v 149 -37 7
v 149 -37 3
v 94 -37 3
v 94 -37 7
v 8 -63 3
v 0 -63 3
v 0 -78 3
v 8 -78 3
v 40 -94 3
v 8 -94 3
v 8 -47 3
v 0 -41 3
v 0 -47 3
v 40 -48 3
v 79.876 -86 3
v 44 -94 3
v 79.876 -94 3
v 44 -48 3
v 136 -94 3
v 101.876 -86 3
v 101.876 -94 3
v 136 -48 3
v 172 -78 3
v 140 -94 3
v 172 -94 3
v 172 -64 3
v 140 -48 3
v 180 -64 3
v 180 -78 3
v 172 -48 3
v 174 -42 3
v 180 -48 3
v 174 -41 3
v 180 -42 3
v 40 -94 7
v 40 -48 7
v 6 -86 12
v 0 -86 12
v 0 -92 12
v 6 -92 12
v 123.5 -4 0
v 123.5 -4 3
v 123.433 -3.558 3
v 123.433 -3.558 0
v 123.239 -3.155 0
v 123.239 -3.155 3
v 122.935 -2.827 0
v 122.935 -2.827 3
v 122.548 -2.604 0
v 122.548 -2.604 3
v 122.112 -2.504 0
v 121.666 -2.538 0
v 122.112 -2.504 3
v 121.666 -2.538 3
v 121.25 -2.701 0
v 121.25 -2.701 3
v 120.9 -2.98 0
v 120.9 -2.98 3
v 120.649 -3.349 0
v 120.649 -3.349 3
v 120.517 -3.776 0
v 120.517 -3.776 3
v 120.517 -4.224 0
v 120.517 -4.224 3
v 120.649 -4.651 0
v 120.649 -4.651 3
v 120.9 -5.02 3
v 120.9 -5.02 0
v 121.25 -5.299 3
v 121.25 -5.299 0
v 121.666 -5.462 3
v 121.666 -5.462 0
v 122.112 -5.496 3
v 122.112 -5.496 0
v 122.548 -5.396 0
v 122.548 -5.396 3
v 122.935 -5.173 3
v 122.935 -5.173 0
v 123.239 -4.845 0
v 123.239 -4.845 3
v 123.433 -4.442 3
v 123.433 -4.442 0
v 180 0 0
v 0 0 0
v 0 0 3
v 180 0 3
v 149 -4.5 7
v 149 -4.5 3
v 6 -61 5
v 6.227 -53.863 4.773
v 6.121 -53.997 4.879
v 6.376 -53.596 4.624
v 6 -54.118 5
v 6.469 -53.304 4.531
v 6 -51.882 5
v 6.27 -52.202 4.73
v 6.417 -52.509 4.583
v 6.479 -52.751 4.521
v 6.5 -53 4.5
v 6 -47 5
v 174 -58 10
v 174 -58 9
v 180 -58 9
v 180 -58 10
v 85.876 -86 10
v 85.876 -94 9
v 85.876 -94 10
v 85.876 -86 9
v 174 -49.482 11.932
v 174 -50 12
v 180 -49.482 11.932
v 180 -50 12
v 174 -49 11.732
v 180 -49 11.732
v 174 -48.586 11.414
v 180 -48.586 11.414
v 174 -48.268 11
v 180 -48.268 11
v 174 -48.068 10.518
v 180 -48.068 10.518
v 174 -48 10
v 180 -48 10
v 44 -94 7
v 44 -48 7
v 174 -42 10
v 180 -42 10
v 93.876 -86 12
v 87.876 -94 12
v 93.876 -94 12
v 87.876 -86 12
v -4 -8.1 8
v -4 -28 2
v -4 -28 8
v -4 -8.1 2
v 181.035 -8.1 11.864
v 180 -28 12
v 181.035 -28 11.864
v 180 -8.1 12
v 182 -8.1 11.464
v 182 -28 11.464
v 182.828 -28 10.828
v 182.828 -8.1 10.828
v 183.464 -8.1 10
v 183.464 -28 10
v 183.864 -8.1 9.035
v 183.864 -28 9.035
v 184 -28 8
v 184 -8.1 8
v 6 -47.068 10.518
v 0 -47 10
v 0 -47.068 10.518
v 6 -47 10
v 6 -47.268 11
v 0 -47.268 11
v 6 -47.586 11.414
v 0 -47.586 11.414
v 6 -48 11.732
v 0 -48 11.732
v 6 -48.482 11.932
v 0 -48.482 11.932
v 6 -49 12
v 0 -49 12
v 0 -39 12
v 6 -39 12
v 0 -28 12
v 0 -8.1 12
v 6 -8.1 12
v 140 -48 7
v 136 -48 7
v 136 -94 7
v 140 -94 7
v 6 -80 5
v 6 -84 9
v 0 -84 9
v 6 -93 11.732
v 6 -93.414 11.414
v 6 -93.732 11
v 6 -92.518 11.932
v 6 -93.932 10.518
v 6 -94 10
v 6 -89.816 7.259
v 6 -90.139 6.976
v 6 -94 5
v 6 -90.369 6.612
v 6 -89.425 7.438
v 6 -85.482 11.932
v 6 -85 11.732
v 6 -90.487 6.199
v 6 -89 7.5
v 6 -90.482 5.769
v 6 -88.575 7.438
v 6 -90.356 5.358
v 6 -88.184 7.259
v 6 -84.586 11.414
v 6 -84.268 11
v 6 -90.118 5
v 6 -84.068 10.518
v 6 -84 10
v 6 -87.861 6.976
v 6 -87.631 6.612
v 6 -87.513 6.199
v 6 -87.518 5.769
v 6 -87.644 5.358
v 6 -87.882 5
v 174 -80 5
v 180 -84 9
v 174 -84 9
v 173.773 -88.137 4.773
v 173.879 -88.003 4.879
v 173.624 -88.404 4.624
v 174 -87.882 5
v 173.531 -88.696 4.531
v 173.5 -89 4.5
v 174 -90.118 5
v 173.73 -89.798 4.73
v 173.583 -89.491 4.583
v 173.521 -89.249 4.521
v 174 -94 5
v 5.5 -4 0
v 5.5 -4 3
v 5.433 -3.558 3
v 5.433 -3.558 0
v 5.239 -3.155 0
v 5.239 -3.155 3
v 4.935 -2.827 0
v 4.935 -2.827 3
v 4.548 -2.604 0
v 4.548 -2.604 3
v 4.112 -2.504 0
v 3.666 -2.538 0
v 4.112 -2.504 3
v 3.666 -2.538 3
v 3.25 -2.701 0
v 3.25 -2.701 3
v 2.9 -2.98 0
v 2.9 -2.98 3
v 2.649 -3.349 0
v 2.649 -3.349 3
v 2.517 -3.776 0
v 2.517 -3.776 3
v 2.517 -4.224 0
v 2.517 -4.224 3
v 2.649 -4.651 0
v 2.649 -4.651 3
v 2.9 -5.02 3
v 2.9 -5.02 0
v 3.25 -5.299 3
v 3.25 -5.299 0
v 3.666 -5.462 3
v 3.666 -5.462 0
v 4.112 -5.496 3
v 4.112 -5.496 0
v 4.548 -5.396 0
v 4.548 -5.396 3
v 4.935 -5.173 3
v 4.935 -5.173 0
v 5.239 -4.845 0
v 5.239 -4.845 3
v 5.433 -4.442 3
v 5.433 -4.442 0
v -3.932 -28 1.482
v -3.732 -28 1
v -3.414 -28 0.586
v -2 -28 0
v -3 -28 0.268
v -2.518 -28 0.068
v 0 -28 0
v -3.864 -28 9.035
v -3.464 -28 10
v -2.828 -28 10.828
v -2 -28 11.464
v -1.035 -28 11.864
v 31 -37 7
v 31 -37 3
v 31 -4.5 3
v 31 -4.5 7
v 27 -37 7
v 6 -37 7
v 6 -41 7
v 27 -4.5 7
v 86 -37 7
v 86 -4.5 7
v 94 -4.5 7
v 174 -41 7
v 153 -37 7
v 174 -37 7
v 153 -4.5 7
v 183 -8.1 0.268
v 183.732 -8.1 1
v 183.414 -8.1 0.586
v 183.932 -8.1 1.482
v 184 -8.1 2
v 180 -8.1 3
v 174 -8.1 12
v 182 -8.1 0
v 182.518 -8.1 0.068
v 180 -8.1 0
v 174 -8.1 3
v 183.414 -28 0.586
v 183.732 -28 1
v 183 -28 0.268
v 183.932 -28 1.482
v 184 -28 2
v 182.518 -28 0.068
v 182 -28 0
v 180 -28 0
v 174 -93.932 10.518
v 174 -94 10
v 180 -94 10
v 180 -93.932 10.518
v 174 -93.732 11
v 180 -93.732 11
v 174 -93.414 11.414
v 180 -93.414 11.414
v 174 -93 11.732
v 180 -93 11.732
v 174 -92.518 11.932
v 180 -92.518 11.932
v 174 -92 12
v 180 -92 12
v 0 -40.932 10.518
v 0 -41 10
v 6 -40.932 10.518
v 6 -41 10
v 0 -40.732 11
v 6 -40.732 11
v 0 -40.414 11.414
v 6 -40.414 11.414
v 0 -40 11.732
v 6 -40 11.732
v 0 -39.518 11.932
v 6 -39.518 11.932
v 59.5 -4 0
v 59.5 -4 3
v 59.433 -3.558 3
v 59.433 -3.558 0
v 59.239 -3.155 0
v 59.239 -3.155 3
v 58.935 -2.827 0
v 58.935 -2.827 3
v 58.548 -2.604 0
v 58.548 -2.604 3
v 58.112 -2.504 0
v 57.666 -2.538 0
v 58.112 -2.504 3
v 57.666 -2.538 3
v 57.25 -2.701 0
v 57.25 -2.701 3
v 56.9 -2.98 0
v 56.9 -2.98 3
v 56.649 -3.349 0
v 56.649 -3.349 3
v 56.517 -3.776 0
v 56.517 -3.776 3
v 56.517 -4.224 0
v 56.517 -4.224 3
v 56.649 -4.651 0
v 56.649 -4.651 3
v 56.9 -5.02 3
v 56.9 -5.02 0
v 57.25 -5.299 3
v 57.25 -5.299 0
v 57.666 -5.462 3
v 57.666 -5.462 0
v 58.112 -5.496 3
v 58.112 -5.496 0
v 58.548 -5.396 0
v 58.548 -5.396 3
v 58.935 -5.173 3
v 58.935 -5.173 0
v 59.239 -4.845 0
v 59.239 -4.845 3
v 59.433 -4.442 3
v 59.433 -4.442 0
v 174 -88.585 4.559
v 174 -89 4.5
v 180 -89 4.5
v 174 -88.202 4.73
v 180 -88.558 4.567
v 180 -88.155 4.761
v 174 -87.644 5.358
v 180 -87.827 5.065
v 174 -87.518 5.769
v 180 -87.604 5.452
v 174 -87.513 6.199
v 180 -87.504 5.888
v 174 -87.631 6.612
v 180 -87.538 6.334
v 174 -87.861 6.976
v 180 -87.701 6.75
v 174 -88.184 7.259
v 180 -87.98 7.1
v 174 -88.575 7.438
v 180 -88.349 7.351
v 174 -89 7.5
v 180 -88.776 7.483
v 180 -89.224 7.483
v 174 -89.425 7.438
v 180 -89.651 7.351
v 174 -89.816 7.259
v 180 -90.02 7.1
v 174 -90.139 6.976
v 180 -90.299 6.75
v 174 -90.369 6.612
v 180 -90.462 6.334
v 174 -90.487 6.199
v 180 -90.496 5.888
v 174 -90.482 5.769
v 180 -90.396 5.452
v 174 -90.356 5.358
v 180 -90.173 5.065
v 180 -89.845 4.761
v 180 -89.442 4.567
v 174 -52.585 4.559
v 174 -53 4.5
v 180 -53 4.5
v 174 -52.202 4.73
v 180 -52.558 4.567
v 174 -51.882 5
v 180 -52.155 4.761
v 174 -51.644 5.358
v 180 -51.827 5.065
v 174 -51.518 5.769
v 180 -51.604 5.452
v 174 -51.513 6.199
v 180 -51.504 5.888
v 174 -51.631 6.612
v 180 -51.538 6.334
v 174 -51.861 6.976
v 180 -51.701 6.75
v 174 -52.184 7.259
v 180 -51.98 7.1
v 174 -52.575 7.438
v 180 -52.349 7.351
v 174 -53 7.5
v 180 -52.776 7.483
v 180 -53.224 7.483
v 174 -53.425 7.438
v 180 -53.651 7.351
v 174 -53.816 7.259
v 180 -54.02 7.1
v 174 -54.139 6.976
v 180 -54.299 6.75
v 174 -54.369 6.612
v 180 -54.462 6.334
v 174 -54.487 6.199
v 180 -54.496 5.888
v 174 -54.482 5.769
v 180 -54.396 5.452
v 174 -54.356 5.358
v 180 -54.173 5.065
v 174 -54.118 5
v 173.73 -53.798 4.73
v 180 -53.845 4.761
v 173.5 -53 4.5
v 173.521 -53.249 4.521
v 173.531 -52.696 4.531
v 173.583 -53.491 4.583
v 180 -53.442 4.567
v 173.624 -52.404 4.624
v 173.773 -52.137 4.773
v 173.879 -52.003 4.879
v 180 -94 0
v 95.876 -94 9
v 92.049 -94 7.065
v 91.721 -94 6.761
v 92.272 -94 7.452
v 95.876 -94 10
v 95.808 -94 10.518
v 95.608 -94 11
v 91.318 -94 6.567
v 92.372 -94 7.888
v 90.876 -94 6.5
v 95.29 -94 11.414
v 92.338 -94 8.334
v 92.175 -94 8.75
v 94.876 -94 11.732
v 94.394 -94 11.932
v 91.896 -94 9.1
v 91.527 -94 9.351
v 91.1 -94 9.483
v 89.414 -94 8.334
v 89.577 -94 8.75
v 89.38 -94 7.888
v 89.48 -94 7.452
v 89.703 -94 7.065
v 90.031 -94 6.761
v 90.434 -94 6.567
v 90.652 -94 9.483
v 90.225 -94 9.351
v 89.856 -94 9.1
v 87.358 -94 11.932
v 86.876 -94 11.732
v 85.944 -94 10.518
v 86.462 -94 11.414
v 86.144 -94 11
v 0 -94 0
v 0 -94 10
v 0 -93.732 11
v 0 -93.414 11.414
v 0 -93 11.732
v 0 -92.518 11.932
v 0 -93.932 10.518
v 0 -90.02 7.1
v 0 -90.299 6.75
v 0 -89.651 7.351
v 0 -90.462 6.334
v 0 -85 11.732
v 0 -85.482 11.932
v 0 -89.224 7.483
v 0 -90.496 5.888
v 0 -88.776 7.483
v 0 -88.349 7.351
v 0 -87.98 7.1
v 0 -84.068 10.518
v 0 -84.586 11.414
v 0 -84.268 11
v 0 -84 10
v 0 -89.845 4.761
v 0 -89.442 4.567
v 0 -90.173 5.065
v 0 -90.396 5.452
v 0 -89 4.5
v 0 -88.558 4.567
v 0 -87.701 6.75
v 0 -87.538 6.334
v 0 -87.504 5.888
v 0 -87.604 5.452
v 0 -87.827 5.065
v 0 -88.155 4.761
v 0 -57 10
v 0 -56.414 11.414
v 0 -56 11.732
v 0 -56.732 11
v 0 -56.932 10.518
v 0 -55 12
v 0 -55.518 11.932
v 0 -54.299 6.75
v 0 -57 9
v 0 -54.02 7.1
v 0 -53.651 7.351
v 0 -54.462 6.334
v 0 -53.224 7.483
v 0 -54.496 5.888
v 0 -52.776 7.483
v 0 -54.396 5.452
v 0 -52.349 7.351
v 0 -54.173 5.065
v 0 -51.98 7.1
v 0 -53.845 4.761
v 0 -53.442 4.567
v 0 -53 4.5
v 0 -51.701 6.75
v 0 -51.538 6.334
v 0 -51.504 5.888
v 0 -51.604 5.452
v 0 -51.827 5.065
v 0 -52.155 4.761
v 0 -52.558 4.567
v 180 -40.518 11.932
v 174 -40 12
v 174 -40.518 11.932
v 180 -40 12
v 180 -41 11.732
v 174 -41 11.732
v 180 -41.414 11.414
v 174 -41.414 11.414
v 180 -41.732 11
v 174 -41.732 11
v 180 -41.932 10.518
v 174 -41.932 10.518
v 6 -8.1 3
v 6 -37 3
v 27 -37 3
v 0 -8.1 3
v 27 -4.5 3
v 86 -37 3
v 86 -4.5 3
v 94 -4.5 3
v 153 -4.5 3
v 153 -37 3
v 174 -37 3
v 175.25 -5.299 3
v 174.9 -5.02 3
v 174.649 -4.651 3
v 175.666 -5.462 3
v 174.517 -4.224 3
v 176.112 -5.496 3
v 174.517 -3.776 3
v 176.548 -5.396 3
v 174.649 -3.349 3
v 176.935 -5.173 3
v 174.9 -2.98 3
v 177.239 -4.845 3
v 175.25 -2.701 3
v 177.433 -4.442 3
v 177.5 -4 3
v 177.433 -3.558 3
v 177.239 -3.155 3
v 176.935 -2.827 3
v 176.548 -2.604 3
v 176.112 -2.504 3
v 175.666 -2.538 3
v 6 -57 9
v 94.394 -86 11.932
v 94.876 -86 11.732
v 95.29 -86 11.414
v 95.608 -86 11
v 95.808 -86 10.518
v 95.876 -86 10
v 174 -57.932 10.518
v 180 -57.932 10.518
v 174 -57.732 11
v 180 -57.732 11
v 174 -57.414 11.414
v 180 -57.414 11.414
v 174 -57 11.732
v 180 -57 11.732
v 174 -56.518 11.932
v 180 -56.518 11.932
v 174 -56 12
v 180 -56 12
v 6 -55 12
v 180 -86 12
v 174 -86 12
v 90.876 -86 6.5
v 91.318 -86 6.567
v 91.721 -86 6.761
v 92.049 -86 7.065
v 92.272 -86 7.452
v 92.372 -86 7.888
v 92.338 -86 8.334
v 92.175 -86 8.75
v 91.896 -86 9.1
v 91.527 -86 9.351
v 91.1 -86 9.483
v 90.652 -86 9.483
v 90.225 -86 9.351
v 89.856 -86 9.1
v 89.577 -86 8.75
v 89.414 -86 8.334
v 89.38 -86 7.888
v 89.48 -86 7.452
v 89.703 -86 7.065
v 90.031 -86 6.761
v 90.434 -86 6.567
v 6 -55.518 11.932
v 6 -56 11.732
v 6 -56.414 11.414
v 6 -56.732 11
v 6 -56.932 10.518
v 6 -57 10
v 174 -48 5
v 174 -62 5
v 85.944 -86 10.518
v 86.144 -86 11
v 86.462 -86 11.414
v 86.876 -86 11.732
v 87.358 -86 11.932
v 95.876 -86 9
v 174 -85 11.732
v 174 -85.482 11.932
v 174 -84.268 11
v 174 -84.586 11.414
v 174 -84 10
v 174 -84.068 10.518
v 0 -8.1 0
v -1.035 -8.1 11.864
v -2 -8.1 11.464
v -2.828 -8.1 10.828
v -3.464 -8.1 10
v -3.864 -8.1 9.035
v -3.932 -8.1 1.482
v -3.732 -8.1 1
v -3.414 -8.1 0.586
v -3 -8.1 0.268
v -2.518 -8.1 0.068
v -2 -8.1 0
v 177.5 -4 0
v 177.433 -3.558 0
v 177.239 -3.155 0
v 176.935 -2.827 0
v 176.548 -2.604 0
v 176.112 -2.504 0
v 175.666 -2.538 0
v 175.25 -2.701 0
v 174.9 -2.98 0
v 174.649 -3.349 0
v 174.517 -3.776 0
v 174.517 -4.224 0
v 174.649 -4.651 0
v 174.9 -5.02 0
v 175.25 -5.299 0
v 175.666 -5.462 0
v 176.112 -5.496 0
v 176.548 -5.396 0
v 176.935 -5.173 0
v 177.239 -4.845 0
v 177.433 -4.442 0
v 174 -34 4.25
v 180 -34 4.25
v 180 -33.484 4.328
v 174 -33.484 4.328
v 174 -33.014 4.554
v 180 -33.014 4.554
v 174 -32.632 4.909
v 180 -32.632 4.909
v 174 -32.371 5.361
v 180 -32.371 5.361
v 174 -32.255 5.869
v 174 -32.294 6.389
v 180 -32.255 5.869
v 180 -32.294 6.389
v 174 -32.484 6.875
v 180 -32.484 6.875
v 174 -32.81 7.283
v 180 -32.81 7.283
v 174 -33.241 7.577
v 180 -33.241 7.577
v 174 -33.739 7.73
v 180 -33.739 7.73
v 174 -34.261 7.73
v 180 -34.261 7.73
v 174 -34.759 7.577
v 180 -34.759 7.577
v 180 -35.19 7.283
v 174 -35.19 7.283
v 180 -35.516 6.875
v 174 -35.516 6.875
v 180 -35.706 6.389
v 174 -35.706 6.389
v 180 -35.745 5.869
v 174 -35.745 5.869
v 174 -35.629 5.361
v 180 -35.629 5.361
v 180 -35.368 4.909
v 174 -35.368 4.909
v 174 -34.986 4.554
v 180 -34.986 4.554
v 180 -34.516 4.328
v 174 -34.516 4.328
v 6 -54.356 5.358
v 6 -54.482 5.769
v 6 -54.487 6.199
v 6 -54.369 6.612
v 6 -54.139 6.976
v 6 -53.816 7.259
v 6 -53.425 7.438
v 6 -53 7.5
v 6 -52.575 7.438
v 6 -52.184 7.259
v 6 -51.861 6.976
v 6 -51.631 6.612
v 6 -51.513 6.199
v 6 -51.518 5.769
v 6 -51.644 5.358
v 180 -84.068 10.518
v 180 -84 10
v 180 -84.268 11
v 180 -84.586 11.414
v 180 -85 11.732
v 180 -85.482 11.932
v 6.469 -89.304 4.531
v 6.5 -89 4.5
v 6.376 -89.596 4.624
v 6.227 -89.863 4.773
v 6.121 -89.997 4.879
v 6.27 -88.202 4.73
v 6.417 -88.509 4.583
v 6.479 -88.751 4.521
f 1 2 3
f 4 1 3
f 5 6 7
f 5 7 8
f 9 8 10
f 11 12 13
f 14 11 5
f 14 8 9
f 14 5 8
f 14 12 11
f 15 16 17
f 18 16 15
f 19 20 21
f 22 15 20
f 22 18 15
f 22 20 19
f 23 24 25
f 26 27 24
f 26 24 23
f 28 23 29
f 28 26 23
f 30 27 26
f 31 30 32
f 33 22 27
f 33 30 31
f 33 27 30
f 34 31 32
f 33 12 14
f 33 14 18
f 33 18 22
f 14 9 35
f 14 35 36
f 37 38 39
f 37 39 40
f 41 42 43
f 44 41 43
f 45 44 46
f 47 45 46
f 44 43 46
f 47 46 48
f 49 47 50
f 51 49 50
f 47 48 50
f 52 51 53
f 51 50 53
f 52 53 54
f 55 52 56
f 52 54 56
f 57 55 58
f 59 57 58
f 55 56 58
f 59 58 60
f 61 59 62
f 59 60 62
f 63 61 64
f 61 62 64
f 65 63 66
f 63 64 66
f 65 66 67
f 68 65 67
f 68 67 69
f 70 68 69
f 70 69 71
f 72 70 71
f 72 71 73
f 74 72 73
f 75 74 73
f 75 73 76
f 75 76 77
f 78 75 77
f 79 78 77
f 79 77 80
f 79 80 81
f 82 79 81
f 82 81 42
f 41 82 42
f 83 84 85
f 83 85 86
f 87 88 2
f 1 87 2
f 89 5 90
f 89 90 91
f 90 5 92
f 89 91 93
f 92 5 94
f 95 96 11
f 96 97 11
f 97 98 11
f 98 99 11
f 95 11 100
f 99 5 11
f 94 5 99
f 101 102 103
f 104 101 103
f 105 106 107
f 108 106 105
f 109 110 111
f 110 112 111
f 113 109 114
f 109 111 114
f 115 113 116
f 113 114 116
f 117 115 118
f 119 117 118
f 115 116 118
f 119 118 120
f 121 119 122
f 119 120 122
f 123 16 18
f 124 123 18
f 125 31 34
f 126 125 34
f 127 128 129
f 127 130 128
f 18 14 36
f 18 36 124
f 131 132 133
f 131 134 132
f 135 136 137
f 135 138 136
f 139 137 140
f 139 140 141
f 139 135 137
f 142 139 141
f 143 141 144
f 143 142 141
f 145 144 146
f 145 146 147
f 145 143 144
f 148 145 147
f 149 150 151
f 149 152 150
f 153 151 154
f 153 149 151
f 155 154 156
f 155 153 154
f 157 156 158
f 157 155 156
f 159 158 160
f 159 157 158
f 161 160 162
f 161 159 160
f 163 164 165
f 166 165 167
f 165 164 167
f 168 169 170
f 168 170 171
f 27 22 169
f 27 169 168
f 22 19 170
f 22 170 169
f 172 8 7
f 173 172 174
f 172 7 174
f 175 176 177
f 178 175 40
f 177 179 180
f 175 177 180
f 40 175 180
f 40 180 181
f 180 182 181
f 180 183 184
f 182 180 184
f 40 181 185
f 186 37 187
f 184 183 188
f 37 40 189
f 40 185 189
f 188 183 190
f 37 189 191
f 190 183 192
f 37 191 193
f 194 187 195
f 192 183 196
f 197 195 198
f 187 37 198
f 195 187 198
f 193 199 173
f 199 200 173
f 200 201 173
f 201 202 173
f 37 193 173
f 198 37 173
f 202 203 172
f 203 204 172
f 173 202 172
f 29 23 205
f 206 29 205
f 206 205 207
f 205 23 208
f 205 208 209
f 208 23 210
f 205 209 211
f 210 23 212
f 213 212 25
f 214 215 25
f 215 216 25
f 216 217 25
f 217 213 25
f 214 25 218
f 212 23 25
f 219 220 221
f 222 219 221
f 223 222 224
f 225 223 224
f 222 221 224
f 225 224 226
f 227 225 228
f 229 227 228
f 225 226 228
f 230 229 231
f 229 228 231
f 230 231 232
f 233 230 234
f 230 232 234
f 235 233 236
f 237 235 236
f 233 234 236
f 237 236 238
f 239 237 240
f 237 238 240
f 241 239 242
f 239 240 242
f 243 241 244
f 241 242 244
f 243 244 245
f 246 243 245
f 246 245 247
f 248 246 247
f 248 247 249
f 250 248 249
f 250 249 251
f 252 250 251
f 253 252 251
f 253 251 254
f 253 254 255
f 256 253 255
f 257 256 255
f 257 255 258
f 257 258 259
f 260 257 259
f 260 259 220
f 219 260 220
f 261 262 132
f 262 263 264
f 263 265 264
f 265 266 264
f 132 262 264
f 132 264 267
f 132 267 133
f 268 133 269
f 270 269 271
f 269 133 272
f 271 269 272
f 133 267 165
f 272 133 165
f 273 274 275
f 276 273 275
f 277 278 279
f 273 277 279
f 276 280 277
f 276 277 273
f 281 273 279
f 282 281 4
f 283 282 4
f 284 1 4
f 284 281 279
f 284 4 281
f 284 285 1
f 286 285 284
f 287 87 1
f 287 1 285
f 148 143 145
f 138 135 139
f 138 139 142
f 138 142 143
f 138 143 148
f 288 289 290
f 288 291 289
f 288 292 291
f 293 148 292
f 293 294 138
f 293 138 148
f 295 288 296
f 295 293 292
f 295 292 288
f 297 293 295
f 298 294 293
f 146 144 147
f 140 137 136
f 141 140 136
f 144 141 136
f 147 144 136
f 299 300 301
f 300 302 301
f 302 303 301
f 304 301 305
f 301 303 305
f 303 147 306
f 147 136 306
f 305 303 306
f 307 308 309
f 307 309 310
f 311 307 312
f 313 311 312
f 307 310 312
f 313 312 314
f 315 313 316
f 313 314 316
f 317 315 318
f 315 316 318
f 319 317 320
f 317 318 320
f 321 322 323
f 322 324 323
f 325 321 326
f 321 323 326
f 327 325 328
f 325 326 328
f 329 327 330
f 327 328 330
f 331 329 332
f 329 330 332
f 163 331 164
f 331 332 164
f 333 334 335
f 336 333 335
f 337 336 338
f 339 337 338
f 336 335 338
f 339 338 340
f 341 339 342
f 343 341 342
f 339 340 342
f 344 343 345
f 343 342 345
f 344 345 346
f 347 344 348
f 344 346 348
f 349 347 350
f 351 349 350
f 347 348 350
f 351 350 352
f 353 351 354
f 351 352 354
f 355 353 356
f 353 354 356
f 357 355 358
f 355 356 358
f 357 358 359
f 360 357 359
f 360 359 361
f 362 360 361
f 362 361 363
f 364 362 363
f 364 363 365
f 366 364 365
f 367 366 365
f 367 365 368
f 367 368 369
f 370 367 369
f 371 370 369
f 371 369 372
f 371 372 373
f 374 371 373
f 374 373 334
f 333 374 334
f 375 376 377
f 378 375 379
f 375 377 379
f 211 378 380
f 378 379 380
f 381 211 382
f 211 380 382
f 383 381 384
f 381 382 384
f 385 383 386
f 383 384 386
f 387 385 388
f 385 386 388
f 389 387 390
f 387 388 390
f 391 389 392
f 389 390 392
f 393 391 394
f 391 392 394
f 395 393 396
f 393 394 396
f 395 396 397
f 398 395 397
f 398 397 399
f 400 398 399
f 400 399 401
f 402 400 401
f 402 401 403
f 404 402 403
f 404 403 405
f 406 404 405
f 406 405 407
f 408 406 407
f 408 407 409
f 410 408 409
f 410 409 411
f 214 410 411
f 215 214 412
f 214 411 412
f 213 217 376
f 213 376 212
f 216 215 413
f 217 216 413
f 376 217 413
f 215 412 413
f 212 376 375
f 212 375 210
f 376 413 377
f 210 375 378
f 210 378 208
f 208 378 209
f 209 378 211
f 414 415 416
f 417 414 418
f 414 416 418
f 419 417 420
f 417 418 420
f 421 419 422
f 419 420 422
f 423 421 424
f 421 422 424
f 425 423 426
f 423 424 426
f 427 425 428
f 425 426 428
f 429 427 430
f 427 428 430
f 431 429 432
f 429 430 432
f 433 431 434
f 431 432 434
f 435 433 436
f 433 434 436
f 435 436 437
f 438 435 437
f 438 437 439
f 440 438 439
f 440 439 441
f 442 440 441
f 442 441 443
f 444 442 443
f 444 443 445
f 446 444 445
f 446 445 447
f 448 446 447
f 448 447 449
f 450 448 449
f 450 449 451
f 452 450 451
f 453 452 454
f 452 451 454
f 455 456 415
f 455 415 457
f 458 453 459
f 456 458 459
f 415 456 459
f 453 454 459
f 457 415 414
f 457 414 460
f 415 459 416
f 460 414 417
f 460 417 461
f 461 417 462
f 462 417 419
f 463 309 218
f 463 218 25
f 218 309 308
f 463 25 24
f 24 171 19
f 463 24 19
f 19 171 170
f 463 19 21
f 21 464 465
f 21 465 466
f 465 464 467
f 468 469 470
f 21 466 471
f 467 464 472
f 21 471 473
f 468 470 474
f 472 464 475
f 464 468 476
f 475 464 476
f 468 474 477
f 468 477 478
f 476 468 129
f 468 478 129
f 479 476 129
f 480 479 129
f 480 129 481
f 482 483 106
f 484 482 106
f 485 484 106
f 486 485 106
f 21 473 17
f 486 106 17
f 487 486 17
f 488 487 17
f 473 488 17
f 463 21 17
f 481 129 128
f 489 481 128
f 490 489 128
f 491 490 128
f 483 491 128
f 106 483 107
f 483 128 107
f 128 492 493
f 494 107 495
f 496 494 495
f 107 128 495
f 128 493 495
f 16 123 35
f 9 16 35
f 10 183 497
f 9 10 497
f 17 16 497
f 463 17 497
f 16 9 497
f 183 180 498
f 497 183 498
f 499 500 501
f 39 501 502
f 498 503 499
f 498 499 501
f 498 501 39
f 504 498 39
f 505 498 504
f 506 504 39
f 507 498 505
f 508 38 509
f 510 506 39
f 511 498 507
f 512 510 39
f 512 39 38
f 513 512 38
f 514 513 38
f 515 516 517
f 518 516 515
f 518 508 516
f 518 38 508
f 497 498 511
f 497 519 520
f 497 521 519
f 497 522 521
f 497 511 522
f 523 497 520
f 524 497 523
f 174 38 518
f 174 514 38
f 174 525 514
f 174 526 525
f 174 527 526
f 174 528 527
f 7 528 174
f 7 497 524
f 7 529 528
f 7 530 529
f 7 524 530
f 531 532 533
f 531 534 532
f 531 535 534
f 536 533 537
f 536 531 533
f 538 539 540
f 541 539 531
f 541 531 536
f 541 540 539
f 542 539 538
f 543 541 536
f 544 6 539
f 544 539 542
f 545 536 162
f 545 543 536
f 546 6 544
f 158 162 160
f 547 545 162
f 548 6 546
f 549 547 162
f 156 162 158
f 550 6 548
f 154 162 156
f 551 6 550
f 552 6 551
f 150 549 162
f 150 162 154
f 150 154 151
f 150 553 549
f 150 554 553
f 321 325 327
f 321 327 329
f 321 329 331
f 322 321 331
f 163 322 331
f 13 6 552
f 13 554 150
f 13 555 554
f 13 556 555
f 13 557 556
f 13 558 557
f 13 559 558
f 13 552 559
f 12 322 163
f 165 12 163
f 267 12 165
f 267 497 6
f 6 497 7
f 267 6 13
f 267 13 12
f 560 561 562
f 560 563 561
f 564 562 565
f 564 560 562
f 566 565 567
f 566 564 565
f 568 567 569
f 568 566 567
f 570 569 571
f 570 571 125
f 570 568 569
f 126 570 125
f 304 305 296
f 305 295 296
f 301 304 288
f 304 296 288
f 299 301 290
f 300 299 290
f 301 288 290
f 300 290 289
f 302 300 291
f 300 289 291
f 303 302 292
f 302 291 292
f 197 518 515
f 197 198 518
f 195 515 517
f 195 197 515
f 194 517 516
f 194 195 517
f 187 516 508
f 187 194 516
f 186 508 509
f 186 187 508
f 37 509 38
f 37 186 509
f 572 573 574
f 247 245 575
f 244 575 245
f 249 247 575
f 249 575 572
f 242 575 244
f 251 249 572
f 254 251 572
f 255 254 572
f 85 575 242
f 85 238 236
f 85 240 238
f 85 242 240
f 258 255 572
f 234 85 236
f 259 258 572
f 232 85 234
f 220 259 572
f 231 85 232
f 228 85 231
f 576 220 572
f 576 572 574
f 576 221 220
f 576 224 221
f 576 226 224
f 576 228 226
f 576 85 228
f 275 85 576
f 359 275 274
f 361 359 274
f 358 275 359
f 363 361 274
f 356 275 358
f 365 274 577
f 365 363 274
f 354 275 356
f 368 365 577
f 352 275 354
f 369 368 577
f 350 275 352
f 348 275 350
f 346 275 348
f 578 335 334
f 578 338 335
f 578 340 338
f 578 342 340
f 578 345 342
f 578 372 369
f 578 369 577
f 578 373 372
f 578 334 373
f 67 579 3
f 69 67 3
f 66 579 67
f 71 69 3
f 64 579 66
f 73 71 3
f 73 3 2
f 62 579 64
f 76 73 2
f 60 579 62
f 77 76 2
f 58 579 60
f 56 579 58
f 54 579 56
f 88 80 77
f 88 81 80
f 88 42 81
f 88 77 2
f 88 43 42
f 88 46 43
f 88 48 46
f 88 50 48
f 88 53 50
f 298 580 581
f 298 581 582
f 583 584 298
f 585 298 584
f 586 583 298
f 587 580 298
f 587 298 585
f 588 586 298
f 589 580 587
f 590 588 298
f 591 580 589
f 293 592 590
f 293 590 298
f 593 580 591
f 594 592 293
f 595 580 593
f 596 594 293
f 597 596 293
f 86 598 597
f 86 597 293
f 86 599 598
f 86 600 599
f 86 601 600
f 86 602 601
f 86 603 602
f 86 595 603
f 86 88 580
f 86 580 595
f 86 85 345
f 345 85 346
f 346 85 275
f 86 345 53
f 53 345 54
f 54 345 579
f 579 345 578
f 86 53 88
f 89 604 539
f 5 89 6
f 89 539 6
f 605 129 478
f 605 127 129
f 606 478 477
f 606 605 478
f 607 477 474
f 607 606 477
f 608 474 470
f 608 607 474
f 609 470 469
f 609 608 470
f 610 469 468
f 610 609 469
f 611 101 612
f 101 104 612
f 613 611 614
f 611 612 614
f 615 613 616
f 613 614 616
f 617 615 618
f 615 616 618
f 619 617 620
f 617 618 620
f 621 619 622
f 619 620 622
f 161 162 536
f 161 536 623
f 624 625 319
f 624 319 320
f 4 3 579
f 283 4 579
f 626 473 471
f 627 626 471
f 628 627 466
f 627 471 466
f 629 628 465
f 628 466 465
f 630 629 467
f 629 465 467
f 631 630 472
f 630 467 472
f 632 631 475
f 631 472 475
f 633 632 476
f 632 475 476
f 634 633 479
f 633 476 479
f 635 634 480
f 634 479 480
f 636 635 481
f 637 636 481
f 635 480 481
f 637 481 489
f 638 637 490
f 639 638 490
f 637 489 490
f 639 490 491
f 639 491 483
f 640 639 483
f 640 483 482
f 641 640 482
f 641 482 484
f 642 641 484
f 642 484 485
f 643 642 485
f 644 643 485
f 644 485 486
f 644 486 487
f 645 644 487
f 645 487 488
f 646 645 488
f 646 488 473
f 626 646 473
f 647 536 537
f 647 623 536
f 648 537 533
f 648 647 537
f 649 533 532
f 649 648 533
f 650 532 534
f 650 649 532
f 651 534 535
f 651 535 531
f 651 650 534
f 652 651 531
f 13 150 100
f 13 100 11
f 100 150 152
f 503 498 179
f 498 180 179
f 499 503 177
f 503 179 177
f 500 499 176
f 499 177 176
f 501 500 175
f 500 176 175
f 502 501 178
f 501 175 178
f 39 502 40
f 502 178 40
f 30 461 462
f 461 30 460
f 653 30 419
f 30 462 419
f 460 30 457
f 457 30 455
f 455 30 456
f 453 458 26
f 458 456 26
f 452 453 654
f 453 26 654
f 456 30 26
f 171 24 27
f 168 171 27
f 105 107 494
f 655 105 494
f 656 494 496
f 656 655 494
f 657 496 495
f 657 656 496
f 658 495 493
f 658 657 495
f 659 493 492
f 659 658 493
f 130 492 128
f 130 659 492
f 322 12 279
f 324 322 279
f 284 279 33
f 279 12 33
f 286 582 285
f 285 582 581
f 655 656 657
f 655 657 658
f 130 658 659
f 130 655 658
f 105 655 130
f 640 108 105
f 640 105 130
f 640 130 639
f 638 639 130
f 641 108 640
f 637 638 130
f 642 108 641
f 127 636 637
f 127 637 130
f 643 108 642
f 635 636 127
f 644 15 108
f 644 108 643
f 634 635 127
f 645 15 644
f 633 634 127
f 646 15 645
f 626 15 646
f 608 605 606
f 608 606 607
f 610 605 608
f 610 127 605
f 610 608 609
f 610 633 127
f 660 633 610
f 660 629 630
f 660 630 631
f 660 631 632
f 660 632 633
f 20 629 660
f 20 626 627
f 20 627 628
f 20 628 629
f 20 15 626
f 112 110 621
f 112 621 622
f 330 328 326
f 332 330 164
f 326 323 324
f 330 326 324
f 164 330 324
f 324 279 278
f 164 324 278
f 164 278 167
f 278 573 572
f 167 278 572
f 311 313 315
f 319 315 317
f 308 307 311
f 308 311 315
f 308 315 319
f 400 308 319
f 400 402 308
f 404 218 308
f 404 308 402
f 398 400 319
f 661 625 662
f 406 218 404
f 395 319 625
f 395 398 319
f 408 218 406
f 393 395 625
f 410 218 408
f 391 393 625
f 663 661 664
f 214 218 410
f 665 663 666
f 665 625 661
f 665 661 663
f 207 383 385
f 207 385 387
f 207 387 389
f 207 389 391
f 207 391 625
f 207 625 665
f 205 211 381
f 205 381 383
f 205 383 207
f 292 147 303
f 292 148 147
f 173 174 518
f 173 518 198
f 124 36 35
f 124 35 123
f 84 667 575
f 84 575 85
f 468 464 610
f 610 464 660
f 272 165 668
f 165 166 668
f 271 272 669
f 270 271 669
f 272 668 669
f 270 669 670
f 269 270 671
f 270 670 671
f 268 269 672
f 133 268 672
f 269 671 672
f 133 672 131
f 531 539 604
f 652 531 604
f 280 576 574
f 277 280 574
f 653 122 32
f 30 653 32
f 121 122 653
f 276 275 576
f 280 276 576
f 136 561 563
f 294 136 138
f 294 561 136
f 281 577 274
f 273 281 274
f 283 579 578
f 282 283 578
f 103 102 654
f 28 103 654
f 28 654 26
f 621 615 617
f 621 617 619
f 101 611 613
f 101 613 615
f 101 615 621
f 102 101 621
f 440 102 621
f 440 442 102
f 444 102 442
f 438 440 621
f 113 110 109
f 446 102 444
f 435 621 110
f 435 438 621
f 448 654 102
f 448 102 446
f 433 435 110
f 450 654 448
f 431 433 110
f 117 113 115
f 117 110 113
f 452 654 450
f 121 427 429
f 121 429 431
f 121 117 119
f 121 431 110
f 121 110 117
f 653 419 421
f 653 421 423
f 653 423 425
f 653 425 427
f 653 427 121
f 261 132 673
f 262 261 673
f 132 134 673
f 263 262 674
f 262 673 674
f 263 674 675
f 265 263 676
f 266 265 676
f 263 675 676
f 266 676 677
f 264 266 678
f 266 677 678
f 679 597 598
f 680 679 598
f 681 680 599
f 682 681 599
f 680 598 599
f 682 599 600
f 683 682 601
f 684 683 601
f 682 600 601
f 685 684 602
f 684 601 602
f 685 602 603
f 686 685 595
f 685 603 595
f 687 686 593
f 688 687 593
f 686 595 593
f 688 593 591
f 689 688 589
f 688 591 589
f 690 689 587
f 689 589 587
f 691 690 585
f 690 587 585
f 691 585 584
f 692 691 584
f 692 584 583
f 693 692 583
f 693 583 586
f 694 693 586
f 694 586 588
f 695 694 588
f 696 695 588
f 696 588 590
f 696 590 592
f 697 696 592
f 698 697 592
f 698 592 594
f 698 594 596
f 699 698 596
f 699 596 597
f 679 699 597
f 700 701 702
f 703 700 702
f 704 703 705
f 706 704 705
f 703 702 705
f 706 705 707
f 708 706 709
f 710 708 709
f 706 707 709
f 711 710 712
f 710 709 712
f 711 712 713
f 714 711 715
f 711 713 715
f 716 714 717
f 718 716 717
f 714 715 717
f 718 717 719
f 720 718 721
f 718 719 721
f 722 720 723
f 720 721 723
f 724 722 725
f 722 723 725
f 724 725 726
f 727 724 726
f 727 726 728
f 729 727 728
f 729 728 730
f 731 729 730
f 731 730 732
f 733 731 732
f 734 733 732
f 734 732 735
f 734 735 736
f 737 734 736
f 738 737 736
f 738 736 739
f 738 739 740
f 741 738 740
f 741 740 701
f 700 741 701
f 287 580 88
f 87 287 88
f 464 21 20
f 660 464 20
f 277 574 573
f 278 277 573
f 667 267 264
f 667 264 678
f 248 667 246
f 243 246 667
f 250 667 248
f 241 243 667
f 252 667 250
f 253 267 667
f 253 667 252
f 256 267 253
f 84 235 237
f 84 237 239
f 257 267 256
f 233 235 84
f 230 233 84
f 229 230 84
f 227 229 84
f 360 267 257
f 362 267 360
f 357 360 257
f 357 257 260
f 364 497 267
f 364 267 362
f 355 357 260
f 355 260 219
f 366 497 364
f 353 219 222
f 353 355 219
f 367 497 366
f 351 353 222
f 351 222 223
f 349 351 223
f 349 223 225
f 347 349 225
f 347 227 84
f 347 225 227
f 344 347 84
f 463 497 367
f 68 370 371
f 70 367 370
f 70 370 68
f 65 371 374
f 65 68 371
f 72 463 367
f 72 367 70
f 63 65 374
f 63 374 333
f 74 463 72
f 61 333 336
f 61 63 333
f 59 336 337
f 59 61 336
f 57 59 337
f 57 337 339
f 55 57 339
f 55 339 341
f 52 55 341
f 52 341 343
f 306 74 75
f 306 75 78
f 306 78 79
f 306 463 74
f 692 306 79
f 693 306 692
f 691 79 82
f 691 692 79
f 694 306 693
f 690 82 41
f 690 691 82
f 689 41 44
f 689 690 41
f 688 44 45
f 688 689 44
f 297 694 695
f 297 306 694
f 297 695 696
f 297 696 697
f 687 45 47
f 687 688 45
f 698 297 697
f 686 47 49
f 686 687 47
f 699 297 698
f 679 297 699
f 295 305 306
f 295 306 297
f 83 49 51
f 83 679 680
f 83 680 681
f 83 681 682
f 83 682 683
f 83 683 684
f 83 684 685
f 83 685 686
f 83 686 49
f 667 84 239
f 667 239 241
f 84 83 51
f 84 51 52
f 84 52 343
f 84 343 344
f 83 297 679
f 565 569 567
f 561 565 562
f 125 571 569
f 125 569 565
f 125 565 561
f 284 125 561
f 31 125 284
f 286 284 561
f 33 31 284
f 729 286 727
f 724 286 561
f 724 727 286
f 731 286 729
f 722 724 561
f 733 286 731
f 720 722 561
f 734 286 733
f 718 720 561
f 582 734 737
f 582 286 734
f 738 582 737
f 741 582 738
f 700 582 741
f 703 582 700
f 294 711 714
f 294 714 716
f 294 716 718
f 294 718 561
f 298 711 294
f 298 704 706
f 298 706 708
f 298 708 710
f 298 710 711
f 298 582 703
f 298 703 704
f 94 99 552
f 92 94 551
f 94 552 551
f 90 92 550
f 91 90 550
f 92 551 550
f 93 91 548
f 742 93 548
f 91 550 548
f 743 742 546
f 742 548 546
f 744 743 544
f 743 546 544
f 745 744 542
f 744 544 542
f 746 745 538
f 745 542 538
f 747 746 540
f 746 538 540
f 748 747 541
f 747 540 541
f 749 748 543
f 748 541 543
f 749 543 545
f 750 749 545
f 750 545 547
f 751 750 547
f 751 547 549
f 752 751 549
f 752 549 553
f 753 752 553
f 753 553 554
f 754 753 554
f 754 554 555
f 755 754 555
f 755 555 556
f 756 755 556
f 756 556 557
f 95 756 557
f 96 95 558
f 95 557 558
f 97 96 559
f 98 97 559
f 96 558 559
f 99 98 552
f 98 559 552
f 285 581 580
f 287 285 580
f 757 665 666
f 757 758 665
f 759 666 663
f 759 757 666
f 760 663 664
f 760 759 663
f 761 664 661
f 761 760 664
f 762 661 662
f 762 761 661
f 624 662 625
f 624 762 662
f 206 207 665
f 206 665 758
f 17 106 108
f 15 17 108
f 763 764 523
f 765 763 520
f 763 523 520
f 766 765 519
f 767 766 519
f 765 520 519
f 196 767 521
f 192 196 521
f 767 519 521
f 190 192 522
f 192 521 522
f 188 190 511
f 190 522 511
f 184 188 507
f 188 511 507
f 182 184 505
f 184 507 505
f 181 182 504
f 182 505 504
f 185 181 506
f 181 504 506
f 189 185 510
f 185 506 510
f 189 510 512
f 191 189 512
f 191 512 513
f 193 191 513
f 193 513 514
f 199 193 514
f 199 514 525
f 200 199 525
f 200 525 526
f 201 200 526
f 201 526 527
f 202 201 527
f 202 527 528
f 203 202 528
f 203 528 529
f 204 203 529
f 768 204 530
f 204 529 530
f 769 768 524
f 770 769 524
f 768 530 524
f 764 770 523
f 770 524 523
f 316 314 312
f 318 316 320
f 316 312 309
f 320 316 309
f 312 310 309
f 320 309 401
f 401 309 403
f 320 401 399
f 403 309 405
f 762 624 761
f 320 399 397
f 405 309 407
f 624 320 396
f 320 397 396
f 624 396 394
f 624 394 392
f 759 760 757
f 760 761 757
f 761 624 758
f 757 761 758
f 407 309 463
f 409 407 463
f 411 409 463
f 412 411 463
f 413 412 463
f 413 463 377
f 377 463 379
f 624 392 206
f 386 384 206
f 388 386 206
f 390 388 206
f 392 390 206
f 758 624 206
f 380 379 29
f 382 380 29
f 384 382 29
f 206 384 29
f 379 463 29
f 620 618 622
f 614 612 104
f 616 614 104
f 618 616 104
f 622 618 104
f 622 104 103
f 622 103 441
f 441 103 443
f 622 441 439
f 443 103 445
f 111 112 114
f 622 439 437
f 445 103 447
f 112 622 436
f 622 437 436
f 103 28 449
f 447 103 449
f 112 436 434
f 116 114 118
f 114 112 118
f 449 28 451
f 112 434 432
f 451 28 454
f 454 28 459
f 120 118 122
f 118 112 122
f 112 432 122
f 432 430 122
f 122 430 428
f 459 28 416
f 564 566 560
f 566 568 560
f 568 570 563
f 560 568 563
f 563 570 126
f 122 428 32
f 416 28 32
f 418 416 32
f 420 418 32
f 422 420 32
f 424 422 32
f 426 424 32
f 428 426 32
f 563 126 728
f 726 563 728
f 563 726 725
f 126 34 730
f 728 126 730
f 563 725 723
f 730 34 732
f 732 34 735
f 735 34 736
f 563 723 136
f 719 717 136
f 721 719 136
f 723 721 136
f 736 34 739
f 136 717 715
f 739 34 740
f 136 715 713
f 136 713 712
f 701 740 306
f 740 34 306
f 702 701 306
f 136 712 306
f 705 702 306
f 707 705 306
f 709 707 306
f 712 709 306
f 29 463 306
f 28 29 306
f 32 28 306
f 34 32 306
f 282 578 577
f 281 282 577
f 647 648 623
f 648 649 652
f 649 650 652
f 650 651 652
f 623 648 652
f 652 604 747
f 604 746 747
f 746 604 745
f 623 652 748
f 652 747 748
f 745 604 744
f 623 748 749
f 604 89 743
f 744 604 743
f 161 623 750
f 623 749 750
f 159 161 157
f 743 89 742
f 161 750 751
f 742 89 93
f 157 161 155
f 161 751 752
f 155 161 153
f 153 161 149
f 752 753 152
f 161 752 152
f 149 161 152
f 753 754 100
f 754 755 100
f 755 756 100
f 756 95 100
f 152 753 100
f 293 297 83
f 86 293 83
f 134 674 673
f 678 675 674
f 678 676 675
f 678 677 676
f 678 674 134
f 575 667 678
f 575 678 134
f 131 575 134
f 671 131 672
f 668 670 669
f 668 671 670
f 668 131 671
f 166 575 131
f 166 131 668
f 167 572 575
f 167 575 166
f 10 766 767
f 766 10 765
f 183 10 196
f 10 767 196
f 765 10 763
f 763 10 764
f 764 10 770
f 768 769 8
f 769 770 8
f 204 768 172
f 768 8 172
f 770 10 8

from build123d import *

# Parameters (mm, degrees)
SKETCH_1_W          = 180
SKETCH_1_H          = 94
EXTRUDE_1_DEPTH     = 3
SKETCH_2_W          = 6
SKETCH_2_H          = 10
SKETCH_2_H_2        = 33.9
SKETCH_2_H_3        = 32.9
SKETCH_2_W_2        = 10
SKETCH_2_H_4        = 8
EXTRUDE_2_DEPTH     = 9
CHAMFER_2_SIZE      = 6
CHAMFER_1_SIZE      = 6
CUT_EXTRUDE_1_REACH = 205.421
SKETCH_3_R          = 1.5
SKETCH_3_R_2        = 1.75
SKETCH_4_R          = 1.5
CUT_EXTRUDE_2_DEPTH = 204.265835791
SKETCH_5_W          = 4
SKETCH_5_H          = 46
EXTRUDE_3_DEPTH     = 4
CHAMFER_3_SIZE      = 2
SKETCH_6_W          = 12
SKETCH_6_H          = 19.9
EXTRUDE_4_DEPTH     = 4
FILLET_1_R          = 4
SKETCH_7_W          = 12
SKETCH_7_H          = 19.9
EXTRUDE_5_DEPTH     = 4
FILLET_2_R          = 4
FILLET_3_R          = 2
SKETCH_8_R          = 1.5
CUT_EXTRUDE_3_DEPTH = 10
CUT_EXTRUDE_4_REACH = 208.969
SKETCH_9_R          = 1.5
CHAMFER_4_SIZE      = 6
FILLET_4_R          = 2


with BuildPart() as part:
    # Эскиз1 → Бобышка-Вытянуть1 (new body)
    with BuildSketch(Plane.XY):
        with Locations((90, -47)):
            Rectangle(SKETCH_1_W, SKETCH_1_H)
    extrude(amount=EXTRUDE_1_DEPTH)

    # Эскиз2 → Бобышка-Вытянуть2 (add)
    with BuildSketch(Plane.XY.offset(3)):
        with Locations((3, -89)):
            Rectangle(SKETCH_2_W, SKETCH_2_H)
        with Locations((177, -89)):
            Rectangle(SKETCH_2_W, SKETCH_2_H)
        with Locations((3, -52)):
            Rectangle(SKETCH_2_W, SKETCH_2_H)
        with Locations((177, -53)):
            Rectangle(SKETCH_2_W, SKETCH_2_H)
        with Locations((177, -25.05)):
            Rectangle(SKETCH_2_W, SKETCH_2_H_2)
        with Locations((3, -24.55)):
            Rectangle(SKETCH_2_W, SKETCH_2_H_3)
        with Locations((90.875995779, -90)):
            Rectangle(SKETCH_2_W_2, SKETCH_2_H_4)
    extrude(amount=EXTRUDE_2_DEPTH)

    # Фаска2
    chamfer_2_edges = [part.edges().sort_by_distance(p)[0] for p in [
        (3, -57, 3),
        (177, -58, 3),
    ]]
    chamfer(chamfer_2_edges, length=CHAMFER_2_SIZE)

    # Фаска1
    chamfer_1_edges = [part.edges().sort_by_distance(p)[0] for p in [
        (3, -84, 3),
        (177, -84, 3),
    ]]
    chamfer(chamfer_1_edges, length=CHAMFER_1_SIZE)

    # Эскиз3 → Вырез-Вытянуть1 (cut, up to next)
    with BuildSketch(Plane(origin=(180, 0, 0), x_dir=(0, 0, -1), z_dir=(1, 0, 0)), mode=Mode.PRIVATE) as cut_extrude_1_sk1:
        with Locations((-6, -89)):
            Circle(SKETCH_3_R)
    cut_extrude_1_tool1 = extrude(cut_extrude_1_sk1.sketch, amount=-CUT_EXTRUDE_1_REACH, mode=Mode.PRIVATE) & part.part
    # Эскиз3 → Вырез-Вытянуть1 (cut, up to next)
    with BuildSketch(Plane(origin=(180, 0, 0), x_dir=(0, 0, -1), z_dir=(1, 0, 0)), mode=Mode.PRIVATE) as cut_extrude_1_sk2:
        with Locations((-6, -53)):
            Circle(SKETCH_3_R)
    cut_extrude_1_tool2 = extrude(cut_extrude_1_sk2.sketch, amount=-CUT_EXTRUDE_1_REACH, mode=Mode.PRIVATE) & part.part
    # Эскиз3 → Вырез-Вытянуть1 (cut, up to next)
    with BuildSketch(Plane(origin=(180, 0, 0), x_dir=(0, 0, -1), z_dir=(1, 0, 0)), mode=Mode.PRIVATE) as cut_extrude_1_sk3:
        with Locations((-6, -34)):
            Circle(SKETCH_3_R_2)
    cut_extrude_1_tool3 = extrude(cut_extrude_1_sk3.sketch, amount=-CUT_EXTRUDE_1_REACH, mode=Mode.PRIVATE) & part.part
    add(cut_extrude_1_tool1.solids().sort_by_distance((180, -89, 6))[0], mode=Mode.SUBTRACT)
    add(cut_extrude_1_tool2.solids().sort_by_distance((180, -53, 6))[0], mode=Mode.SUBTRACT)
    add(cut_extrude_1_tool3.solids().sort_by_distance((180, -34, 6))[0], mode=Mode.SUBTRACT)

    # Эскиз4 → Вырез-Вытянуть2 (cut, through all)
    with BuildSketch(Plane.XY.offset(3)):
        with Locations((4, -4)):
            Circle(SKETCH_4_R)
        with Locations((176, -4)):
            Circle(SKETCH_4_R)
        with Locations((58, -4)):
            Circle(SKETCH_4_R)
        with Locations((122, -4)):
            Circle(SKETCH_4_R)
    extrude(amount=-CUT_EXTRUDE_2_DEPTH, mode=Mode.SUBTRACT)

    # Эскиз5 → Бобышка-Вытянуть3 (add)
    with BuildSketch(Plane.XY.offset(3)):
        with Locations((42, -71)):
            Rectangle(SKETCH_5_W, SKETCH_5_H)
        with Locations((138, -71)):
            Rectangle(SKETCH_5_W, SKETCH_5_H)
        Polygon((27, -4.5), (27, -37), (6, -37), (6, -41), (174, -41), (174, -37), (153, -37), (153, -4.5), (149, -4.5), (149, -37), (94, -37), (94, -4.5), (86, -4.5), (86, -37), (31, -37), (31, -4.5), align=None)
    extrude(amount=EXTRUDE_3_DEPTH)

    # Фаска3
    # the kernel refuses this chamfer: 2 mm, written as the material it adds along each edge
    with BuildSketch(Plane(origin=(6, -72.856634024, 3), x_dir=(0.9996219169112968, 0, -0.02749587661058627), z_dir=(0, -1, 0))) as chamfer_3_piece_1_section:
        Polygon((CHAMFER_3_SIZE * 0.999621916911, CHAMFER_3_SIZE * 0.0274958766106), (-CHAMFER_3_SIZE * 0.0274958766106, CHAMFER_3_SIZE * 0.999621916911), (0, 0), align=None)
    chamfer_3_piece_1 = extrude(amount=21.143365976, mode=Mode.PRIVATE)
    chamfer_3_piece_1 = split(chamfer_3_piece_1, bisect_by=Plane(origin=(6.668439358, -82.482271763, 7.482271763), z_dir=(0, -0.7071067811865476, -0.7071067811865476)), keep=Keep.TOP, mode=Mode.PRIVATE)
    add(chamfer_3_piece_1)
    with BuildSketch(Plane(origin=(174, -94, 3), x_dir=(-0.9996219169112968, 0, -0.02749587661058639), z_dir=(0, 1, 0))) as chamfer_3_piece_2_section:
        Polygon((CHAMFER_3_SIZE * 0.999621916911, CHAMFER_3_SIZE * 0.0274958766106), (-CHAMFER_3_SIZE * 0.0274958766106, CHAMFER_3_SIZE * 0.999621916911), (0, 0), align=None)
    chamfer_3_piece_2 = extrude(amount=21.143365976, mode=Mode.PRIVATE)
    chamfer_3_piece_2 = split(chamfer_3_piece_2, bisect_by=Plane(origin=(173.327651835, -82.469530213, 7.469530213), z_dir=(2.038461385028344e-15, -0.7071067811865476, -0.7071067811865476)), keep=Keep.TOP, mode=Mode.PRIVATE)
    chamfer_3_piece_2 = chamfer_3_piece_2 - Plane(origin=(173.327651835, -89, 6), x_dir=(0, 0, -1), z_dir=(1, 0, 0)) * Cylinder(1.5, 51, mode=Mode.PRIVATE)
    add(chamfer_3_piece_2)
    with BuildSketch(Plane(origin=(6, -47, 3), x_dir=(0.9996219169112968, 0, -0.02749587661058627), z_dir=(0, -1, 0))) as chamfer_3_piece_3_section:
        Polygon((CHAMFER_3_SIZE * 0.999621916911, CHAMFER_3_SIZE * 0.0274958766106), (-CHAMFER_3_SIZE * 0.0274958766106, CHAMFER_3_SIZE * 0.999621916911), (0, 0), align=None)
    chamfer_3_piece_3 = extrude(amount=21.143365976, mode=Mode.PRIVATE)
    chamfer_3_piece_3 = split(chamfer_3_piece_3, bisect_by=Plane(origin=(6.668439358, -58.517728237, 7.482271763), z_dir=(0, 0.7071067811865476, -0.7071067811865476)), keep=Keep.TOP, mode=Mode.PRIVATE)
    add(chamfer_3_piece_3)
    with BuildSketch(Plane(origin=(174, -69.143365976, 3), x_dir=(-0.9996219169112968, 0, -0.02749587661058639), z_dir=(0, 1, 0))) as chamfer_3_piece_4_section:
        Polygon((CHAMFER_3_SIZE * 0.999621916911, CHAMFER_3_SIZE * 0.0274958766106), (-CHAMFER_3_SIZE * 0.0274958766106, CHAMFER_3_SIZE * 0.999621916911), (0, 0), align=None)
    chamfer_3_piece_4 = extrude(amount=21.143365976, mode=Mode.PRIVATE)
    chamfer_3_piece_4 = split(chamfer_3_piece_4, bisect_by=Plane(origin=(173.327651834, -59.530469789, 7.469530211), z_dir=(0, 0.7071067811865476, -0.7071067811865476)), keep=Keep.TOP, mode=Mode.PRIVATE)
    chamfer_3_piece_4 = chamfer_3_piece_4 - Plane(origin=(173.327651834, -53, 6), x_dir=(0, 0, -1), z_dir=(1, 0, 0)) * Cylinder(1.5, 51, mode=Mode.PRIVATE)
    add(chamfer_3_piece_4)

    # Эскиз6 → Бобышка-Вытянуть4 (add)
    with BuildSketch(Plane(origin=(180, 0, 0), x_dir=(0, 0, -1), z_dir=(1, 0, 0))):
        with Locations((-6, -18.05)):
            Rectangle(SKETCH_6_W, SKETCH_6_H)
    extrude(amount=EXTRUDE_4_DEPTH)

    # Скругление1
    fillet_1_edges = [part.edges().sort_by_distance(p)[0] for p in [
        (184, -18.05, 12),
    ]]
    fillet(fillet_1_edges, radius=FILLET_1_R)

    # Эскиз7 → Бобышка-Вытянуть5 (add)
    with BuildSketch(Plane.ZY):
        with Locations((6, -18.05)):
            Rectangle(SKETCH_7_W, SKETCH_7_H)
    extrude(amount=EXTRUDE_5_DEPTH)

    # Скругление2
    fillet_2_edges = [part.edges().sort_by_distance(p)[0] for p in [
        (-4, -18.05, 12),
    ]]
    fillet(fillet_2_edges, radius=FILLET_2_R)

    # Скругление3
    fillet_3_edges = [part.edges().sort_by_distance(p)[0] for p in [
        (184, -18.05, 0),
        (-4, -18.05, 0),
    ]]
    fillet(fillet_3_edges, radius=FILLET_3_R)

    # Эскиз8 → Вырез-Вытянуть3 (cut)
    with BuildSketch(Plane.XZ.offset(94)):
        with Locations(Location((90.875995779, 8, 0), (0, 0, 270))):
            Circle(SKETCH_8_R)
    extrude(amount=-CUT_EXTRUDE_3_DEPTH, mode=Mode.SUBTRACT)

    # Эскиз9 → Вырез-Вытянуть4 (cut, up to next)
    with BuildSketch(Plane.ZY, mode=Mode.PRIVATE) as cut_extrude_4_sk1:
        with Locations(Location((6, -89, 0), (0, 0, 180))):
            Circle(SKETCH_9_R)
    cut_extrude_4_tool1 = extrude(cut_extrude_4_sk1.sketch, amount=-CUT_EXTRUDE_4_REACH, mode=Mode.PRIVATE) & part.part
    # Эскиз9 → Вырез-Вытянуть4 (cut, up to next)
    with BuildSketch(Plane.ZY, mode=Mode.PRIVATE) as cut_extrude_4_sk2:
        with Locations(Location((6, -53, 0), (0, 0, 180))):
            Circle(SKETCH_9_R)
    cut_extrude_4_tool2 = extrude(cut_extrude_4_sk2.sketch, amount=-CUT_EXTRUDE_4_REACH, mode=Mode.PRIVATE) & part.part
    add(cut_extrude_4_tool1.solids().sort_by_distance((0, -89, 6))[0], mode=Mode.SUBTRACT)
    add(cut_extrude_4_tool2.solids().sort_by_distance((0, -53, 6))[0], mode=Mode.SUBTRACT)

    # Фаска4
    chamfer_4_edges = [part.edges().sort_by_distance(p)[0] for p in [
        (85.875995779, -90, 3),
        (95.875995779, -90, 3),
    ]]
    chamfer(chamfer_4_edges, length=CHAMFER_4_SIZE)

    # Скругление4
    fillet_4_edges = [part.edges().sort_by_distance(p)[0] for p in [
        (177, -84, 12),
        (3, -84, 12),
        (3, -41, 12),
        (3, -47, 12),
        (3, -57, 12),
        (3, -94, 12),
        (177, -42, 12),
        (177, -48, 12),
        (177, -58, 12),
        (85.875995779, -90, 12),
        (95.875995779, -90, 12),
        (177, -94, 12),
    ]]
    fillet(fillet_4_edges, radius=FILLET_4_R)


solid = part.part
